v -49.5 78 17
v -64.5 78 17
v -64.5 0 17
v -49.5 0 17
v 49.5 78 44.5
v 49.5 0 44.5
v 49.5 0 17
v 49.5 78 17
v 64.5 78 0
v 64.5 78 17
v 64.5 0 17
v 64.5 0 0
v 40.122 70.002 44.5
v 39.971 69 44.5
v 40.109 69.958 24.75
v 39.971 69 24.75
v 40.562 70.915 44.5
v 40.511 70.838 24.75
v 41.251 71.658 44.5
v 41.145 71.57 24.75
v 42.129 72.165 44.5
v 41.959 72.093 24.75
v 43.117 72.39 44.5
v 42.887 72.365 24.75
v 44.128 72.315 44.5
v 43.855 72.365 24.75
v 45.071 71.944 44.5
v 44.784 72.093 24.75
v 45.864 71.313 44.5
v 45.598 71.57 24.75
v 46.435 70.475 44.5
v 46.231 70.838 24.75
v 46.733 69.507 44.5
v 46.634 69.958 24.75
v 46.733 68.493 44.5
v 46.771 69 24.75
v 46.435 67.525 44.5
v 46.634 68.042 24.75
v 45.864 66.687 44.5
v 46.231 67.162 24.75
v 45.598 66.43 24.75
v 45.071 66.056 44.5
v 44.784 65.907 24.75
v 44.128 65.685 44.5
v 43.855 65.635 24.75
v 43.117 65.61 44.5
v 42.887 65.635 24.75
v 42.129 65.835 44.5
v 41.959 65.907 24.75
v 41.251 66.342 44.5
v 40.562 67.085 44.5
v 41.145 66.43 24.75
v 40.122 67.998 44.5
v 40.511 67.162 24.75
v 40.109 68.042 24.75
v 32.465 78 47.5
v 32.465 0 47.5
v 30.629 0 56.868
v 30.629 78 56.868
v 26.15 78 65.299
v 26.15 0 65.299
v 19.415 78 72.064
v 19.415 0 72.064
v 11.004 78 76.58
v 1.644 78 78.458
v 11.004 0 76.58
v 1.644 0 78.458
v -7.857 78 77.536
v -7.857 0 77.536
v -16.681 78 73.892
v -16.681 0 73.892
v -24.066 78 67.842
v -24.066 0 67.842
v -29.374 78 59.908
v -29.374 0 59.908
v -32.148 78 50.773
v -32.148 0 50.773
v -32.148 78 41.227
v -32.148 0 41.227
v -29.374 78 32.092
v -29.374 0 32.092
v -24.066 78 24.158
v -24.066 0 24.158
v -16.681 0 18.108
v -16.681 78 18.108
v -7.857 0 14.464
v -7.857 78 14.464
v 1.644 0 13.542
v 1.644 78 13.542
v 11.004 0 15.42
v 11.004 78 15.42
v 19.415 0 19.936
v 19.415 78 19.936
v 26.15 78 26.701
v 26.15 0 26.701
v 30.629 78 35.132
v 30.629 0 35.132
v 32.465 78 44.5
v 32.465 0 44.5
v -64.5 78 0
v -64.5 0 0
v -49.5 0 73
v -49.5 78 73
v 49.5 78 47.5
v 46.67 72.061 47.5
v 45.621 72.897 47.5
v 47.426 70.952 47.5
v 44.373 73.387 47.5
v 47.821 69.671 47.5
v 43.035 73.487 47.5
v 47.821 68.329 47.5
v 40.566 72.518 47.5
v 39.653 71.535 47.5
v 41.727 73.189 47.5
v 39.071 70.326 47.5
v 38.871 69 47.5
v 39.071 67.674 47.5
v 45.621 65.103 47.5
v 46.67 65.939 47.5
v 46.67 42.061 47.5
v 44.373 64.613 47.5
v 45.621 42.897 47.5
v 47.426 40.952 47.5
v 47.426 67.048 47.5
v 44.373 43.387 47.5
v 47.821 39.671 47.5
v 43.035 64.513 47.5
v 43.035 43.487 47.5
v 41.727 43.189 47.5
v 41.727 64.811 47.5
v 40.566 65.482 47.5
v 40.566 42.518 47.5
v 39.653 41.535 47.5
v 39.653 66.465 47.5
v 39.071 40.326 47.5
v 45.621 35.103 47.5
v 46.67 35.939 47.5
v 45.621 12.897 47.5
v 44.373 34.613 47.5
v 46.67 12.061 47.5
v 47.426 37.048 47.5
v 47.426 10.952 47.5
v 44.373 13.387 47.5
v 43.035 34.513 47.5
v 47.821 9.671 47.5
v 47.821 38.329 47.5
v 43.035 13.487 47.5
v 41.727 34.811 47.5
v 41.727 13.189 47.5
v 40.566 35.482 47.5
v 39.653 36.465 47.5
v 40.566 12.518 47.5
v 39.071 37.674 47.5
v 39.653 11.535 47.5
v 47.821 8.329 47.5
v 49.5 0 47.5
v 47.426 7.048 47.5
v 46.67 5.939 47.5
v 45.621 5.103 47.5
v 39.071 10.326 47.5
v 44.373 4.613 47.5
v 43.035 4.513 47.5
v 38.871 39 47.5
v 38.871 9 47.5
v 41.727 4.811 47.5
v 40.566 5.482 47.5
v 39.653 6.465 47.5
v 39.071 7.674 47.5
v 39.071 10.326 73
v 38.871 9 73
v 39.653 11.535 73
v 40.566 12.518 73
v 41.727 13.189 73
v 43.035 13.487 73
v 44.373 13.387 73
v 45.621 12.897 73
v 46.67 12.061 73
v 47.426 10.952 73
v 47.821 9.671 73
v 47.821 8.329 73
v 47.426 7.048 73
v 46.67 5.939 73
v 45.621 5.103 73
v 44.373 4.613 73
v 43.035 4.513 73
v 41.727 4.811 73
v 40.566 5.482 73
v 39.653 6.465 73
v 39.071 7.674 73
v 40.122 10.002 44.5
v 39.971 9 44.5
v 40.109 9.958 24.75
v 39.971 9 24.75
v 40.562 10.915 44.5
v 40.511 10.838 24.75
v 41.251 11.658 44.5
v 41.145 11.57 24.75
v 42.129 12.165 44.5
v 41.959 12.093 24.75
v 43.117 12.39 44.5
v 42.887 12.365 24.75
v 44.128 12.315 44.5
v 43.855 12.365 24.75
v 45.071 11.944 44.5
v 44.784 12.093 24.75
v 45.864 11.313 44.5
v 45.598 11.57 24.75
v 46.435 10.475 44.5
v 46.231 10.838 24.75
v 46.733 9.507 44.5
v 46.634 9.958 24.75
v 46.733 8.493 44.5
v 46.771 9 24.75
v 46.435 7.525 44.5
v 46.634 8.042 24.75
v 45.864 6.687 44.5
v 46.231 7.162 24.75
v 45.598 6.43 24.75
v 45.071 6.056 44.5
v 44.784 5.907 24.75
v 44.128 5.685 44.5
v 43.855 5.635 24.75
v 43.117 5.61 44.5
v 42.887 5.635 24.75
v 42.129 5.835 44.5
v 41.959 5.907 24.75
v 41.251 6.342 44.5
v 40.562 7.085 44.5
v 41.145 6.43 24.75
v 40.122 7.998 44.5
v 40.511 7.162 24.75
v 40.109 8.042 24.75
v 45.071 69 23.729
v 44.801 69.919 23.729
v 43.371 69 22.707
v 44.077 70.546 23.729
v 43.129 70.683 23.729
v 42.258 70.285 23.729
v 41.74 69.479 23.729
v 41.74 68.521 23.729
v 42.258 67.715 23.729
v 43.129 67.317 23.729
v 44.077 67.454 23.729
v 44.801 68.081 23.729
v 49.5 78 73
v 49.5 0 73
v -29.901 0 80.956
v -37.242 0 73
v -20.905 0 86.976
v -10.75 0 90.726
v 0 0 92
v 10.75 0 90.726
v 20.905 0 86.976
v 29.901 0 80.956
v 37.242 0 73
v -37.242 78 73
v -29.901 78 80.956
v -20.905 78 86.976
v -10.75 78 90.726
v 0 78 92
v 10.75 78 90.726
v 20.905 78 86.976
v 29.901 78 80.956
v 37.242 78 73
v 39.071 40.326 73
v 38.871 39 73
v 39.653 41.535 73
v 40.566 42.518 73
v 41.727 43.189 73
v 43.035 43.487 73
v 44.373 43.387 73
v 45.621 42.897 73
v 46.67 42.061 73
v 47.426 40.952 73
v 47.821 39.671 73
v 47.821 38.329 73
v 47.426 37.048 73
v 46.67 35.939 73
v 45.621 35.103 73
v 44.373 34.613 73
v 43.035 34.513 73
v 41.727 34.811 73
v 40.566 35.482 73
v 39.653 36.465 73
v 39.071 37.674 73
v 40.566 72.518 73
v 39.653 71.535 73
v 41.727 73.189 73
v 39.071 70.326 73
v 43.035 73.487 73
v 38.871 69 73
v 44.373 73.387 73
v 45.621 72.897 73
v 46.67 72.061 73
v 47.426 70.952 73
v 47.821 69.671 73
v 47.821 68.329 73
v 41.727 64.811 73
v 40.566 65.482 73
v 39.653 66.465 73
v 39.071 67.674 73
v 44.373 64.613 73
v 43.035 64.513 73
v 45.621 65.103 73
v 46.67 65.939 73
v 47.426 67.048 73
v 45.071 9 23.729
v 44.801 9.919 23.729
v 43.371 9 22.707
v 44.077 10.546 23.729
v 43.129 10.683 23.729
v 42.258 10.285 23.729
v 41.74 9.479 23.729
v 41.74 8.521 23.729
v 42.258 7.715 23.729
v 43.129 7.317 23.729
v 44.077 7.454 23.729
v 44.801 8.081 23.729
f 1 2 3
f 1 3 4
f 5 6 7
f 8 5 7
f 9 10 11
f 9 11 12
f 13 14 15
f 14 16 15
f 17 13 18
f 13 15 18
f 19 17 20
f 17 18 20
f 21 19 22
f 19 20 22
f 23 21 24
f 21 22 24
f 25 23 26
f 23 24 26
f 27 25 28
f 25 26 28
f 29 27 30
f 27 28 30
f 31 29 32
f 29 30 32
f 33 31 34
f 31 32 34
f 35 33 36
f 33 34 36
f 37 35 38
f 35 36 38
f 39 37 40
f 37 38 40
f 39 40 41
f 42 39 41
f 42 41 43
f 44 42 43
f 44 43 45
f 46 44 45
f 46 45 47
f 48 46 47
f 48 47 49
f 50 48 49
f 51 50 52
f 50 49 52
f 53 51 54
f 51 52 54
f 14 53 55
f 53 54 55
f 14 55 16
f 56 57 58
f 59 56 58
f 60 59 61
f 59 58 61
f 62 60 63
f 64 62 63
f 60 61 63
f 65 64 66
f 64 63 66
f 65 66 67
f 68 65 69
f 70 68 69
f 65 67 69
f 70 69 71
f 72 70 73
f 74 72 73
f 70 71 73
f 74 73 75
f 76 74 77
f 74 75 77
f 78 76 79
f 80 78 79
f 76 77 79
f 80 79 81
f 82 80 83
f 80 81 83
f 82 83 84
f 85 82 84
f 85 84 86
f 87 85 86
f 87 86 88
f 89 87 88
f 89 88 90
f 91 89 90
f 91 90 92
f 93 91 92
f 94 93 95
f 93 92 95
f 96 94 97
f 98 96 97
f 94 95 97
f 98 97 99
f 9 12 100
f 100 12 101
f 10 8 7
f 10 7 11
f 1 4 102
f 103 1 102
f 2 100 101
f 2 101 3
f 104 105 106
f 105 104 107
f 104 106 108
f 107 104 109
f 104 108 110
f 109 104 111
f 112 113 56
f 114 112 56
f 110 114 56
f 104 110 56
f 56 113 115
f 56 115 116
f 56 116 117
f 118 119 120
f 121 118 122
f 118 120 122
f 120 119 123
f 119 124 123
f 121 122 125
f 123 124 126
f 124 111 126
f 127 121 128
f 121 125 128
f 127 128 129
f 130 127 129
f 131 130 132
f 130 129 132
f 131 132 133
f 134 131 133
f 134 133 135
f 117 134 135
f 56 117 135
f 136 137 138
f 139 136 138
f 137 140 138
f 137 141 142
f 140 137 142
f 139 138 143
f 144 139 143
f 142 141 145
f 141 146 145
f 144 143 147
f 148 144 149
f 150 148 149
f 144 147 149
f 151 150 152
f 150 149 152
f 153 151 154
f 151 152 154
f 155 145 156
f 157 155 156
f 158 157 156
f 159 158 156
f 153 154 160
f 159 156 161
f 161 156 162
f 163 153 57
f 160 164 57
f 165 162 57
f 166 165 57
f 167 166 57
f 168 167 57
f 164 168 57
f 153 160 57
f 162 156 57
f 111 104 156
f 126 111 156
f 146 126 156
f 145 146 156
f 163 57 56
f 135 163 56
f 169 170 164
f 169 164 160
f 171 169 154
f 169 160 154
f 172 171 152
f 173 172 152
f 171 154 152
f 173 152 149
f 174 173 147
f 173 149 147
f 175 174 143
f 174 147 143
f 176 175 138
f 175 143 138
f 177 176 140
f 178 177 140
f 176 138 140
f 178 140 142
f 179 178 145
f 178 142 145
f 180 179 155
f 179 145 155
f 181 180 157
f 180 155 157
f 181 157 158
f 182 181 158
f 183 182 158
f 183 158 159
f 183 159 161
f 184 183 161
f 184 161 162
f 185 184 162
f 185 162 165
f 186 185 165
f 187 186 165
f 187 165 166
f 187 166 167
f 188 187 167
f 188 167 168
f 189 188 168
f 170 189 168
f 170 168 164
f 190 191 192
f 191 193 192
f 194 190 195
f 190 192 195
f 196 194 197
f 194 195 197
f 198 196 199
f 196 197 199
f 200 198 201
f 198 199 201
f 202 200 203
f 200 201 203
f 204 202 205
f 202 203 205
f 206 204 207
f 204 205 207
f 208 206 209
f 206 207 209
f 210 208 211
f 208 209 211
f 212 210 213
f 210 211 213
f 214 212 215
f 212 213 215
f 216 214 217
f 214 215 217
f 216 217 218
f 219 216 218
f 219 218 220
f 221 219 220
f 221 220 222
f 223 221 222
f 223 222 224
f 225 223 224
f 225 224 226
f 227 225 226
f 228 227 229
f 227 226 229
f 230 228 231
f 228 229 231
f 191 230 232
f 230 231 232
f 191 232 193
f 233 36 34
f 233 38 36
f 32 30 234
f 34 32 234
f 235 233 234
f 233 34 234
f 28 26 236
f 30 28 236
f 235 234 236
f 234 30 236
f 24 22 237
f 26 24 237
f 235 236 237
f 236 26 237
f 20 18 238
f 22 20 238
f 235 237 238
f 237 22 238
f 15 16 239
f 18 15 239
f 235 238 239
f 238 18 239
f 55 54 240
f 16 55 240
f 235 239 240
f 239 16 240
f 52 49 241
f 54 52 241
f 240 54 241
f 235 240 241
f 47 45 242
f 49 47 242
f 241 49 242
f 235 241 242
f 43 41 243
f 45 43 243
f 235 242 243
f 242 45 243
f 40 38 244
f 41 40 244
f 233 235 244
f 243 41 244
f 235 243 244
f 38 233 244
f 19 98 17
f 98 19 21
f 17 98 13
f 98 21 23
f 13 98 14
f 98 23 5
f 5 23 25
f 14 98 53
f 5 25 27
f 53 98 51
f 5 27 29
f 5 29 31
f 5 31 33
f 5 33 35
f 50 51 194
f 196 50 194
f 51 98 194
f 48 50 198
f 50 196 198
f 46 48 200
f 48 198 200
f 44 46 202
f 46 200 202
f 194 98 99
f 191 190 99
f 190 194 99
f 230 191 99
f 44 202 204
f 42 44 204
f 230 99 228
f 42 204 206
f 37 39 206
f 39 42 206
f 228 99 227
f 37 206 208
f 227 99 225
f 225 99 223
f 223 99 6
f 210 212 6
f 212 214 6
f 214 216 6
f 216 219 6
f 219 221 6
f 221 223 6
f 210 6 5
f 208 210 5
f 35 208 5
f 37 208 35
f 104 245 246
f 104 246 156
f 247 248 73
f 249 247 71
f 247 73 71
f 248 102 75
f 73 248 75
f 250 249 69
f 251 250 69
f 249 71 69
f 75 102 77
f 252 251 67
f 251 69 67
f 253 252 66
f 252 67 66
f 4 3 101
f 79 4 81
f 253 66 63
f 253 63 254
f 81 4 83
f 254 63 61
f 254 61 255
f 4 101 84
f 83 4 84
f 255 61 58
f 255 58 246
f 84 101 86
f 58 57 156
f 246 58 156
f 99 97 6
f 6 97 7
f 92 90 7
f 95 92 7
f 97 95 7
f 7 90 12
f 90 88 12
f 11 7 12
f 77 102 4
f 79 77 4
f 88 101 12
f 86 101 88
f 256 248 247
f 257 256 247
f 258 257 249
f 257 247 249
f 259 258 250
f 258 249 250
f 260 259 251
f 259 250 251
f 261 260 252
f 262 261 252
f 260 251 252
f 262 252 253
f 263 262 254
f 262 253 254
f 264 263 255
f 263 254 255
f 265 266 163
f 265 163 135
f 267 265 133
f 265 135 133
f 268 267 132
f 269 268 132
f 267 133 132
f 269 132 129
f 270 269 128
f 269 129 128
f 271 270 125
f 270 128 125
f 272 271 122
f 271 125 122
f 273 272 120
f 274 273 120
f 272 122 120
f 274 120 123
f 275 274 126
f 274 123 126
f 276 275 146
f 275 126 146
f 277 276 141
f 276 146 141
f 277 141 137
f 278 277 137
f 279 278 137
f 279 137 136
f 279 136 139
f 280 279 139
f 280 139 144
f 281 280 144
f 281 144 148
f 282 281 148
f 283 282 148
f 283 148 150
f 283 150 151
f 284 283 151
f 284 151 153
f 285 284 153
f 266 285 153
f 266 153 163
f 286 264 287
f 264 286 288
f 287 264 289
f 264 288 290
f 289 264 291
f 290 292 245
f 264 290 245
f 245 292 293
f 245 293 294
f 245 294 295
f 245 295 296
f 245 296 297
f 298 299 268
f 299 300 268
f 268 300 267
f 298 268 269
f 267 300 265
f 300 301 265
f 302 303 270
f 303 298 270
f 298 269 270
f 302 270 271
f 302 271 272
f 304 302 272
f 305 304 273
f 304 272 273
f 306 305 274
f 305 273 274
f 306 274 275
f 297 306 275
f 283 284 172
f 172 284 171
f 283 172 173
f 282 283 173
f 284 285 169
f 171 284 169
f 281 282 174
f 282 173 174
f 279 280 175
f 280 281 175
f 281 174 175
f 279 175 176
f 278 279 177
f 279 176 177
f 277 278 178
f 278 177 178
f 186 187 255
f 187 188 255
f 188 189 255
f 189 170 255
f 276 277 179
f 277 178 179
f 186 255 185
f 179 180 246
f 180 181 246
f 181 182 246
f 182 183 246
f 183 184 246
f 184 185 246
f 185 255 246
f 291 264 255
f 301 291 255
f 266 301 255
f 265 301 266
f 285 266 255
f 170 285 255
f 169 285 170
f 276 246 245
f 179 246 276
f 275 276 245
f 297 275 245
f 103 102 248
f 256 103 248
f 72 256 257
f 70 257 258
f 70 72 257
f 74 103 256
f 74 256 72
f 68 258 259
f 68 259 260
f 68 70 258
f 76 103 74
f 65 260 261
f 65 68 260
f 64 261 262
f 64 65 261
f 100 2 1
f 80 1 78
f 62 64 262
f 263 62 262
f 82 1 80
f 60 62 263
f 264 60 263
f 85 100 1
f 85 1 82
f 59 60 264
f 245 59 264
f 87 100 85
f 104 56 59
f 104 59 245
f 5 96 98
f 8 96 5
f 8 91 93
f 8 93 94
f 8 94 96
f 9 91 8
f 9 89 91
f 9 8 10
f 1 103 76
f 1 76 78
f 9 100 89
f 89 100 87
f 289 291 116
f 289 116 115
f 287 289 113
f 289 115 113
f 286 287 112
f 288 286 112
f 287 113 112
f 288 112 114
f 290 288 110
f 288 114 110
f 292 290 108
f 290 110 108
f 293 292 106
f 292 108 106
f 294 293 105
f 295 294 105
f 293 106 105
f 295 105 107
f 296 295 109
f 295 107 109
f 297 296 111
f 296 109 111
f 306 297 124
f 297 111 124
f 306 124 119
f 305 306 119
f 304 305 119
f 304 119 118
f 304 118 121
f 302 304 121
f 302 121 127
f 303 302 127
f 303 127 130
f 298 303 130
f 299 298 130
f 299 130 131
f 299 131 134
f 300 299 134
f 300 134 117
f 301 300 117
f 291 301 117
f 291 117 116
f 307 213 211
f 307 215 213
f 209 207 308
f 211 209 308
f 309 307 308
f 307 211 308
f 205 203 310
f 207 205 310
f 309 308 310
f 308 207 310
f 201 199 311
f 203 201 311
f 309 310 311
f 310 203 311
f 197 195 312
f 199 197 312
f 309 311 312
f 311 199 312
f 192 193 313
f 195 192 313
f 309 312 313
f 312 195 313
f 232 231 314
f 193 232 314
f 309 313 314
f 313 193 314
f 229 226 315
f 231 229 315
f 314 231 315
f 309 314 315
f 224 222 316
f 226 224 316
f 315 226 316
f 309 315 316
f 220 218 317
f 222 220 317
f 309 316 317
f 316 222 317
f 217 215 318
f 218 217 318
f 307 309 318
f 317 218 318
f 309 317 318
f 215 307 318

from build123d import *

# Parameters (mm, degrees)
BOSS_EXTRUDE1_DEPTH          = 78
F_9_0_9_DIAMETER_HOLE1_D     = 9
F_9_0_9_DIAMETER_HOLE1_DEPTH = 25.5
M8_TAPPED_HOLE1_D            = 6.8
M8_TAPPED_HOLE1_DEPTH        = 19.75
M8_TAPPED_HOLE1_TIP          = 2.042926105


with BuildPart() as part:
    # Sketch1 → Boss-Extrude1 (new body)
    with BuildSketch(Plane(origin=(0, 0, 0), x_dir=(1, 0, 0), z_dir=(0, 1, 0))):
        with BuildLine():
            Line((-64.5, 0), (-64.5, -17))
            Line((-64.5, -17), (-49.5, -17))
            Line((-49.5, -17), (-49.5, -73))
            Line((-49.5, -73), (-37.242448899, -73))
            ThreePointArc((-37.242448899, -73), (0, -92), (37.242448899, -73))
            Line((37.242448899, -73), (49.5, -73))
            Line((49.5, -73), (49.5, -47.5))
            Line((49.5, -47.5), (32.465366161, -47.5))
            ThreePointArc((32.465366161, -47.5), (-32.5, -46), (32.465366161, -44.5))
            Line((32.465366161, -44.5), (49.5, -44.5))
            Line((49.5, -44.5), (49.5, -17))
            Line((49.5, -17), (64.5, -17))
            Line((64.5, -17), (64.5, 0))
            Line((64.5, 0), (0, 0))
            Line((0, 0), (-64.5, 0))
        make_face()
    extrude(amount=BOSS_EXTRUDE1_DEPTH)

    # Ø9.0 (9) Diameter Hole1
    with Locations(Plane.XY.offset(73)):
        with Locations((43.37122445, 69), (43.37122445, 39), (43.37122445, 9)):
            Hole(F_9_0_9_DIAMETER_HOLE1_D / 2, depth=F_9_0_9_DIAMETER_HOLE1_DEPTH)

    # M8 Tapped Hole1
    with Locations(Plane.XY.offset(44.5)):
        with Locations((43.37122445, 69), (43.37122445, 9)):
            Hole(M8_TAPPED_HOLE1_D / 2, depth=M8_TAPPED_HOLE1_DEPTH)
            with Locations((0, 0, -(M8_TAPPED_HOLE1_DEPTH + M8_TAPPED_HOLE1_TIP / 2))):  # 118° drill point
                Cone(0, M8_TAPPED_HOLE1_D / 2, M8_TAPPED_HOLE1_TIP, mode=Mode.SUBTRACT)


solid = part.part
